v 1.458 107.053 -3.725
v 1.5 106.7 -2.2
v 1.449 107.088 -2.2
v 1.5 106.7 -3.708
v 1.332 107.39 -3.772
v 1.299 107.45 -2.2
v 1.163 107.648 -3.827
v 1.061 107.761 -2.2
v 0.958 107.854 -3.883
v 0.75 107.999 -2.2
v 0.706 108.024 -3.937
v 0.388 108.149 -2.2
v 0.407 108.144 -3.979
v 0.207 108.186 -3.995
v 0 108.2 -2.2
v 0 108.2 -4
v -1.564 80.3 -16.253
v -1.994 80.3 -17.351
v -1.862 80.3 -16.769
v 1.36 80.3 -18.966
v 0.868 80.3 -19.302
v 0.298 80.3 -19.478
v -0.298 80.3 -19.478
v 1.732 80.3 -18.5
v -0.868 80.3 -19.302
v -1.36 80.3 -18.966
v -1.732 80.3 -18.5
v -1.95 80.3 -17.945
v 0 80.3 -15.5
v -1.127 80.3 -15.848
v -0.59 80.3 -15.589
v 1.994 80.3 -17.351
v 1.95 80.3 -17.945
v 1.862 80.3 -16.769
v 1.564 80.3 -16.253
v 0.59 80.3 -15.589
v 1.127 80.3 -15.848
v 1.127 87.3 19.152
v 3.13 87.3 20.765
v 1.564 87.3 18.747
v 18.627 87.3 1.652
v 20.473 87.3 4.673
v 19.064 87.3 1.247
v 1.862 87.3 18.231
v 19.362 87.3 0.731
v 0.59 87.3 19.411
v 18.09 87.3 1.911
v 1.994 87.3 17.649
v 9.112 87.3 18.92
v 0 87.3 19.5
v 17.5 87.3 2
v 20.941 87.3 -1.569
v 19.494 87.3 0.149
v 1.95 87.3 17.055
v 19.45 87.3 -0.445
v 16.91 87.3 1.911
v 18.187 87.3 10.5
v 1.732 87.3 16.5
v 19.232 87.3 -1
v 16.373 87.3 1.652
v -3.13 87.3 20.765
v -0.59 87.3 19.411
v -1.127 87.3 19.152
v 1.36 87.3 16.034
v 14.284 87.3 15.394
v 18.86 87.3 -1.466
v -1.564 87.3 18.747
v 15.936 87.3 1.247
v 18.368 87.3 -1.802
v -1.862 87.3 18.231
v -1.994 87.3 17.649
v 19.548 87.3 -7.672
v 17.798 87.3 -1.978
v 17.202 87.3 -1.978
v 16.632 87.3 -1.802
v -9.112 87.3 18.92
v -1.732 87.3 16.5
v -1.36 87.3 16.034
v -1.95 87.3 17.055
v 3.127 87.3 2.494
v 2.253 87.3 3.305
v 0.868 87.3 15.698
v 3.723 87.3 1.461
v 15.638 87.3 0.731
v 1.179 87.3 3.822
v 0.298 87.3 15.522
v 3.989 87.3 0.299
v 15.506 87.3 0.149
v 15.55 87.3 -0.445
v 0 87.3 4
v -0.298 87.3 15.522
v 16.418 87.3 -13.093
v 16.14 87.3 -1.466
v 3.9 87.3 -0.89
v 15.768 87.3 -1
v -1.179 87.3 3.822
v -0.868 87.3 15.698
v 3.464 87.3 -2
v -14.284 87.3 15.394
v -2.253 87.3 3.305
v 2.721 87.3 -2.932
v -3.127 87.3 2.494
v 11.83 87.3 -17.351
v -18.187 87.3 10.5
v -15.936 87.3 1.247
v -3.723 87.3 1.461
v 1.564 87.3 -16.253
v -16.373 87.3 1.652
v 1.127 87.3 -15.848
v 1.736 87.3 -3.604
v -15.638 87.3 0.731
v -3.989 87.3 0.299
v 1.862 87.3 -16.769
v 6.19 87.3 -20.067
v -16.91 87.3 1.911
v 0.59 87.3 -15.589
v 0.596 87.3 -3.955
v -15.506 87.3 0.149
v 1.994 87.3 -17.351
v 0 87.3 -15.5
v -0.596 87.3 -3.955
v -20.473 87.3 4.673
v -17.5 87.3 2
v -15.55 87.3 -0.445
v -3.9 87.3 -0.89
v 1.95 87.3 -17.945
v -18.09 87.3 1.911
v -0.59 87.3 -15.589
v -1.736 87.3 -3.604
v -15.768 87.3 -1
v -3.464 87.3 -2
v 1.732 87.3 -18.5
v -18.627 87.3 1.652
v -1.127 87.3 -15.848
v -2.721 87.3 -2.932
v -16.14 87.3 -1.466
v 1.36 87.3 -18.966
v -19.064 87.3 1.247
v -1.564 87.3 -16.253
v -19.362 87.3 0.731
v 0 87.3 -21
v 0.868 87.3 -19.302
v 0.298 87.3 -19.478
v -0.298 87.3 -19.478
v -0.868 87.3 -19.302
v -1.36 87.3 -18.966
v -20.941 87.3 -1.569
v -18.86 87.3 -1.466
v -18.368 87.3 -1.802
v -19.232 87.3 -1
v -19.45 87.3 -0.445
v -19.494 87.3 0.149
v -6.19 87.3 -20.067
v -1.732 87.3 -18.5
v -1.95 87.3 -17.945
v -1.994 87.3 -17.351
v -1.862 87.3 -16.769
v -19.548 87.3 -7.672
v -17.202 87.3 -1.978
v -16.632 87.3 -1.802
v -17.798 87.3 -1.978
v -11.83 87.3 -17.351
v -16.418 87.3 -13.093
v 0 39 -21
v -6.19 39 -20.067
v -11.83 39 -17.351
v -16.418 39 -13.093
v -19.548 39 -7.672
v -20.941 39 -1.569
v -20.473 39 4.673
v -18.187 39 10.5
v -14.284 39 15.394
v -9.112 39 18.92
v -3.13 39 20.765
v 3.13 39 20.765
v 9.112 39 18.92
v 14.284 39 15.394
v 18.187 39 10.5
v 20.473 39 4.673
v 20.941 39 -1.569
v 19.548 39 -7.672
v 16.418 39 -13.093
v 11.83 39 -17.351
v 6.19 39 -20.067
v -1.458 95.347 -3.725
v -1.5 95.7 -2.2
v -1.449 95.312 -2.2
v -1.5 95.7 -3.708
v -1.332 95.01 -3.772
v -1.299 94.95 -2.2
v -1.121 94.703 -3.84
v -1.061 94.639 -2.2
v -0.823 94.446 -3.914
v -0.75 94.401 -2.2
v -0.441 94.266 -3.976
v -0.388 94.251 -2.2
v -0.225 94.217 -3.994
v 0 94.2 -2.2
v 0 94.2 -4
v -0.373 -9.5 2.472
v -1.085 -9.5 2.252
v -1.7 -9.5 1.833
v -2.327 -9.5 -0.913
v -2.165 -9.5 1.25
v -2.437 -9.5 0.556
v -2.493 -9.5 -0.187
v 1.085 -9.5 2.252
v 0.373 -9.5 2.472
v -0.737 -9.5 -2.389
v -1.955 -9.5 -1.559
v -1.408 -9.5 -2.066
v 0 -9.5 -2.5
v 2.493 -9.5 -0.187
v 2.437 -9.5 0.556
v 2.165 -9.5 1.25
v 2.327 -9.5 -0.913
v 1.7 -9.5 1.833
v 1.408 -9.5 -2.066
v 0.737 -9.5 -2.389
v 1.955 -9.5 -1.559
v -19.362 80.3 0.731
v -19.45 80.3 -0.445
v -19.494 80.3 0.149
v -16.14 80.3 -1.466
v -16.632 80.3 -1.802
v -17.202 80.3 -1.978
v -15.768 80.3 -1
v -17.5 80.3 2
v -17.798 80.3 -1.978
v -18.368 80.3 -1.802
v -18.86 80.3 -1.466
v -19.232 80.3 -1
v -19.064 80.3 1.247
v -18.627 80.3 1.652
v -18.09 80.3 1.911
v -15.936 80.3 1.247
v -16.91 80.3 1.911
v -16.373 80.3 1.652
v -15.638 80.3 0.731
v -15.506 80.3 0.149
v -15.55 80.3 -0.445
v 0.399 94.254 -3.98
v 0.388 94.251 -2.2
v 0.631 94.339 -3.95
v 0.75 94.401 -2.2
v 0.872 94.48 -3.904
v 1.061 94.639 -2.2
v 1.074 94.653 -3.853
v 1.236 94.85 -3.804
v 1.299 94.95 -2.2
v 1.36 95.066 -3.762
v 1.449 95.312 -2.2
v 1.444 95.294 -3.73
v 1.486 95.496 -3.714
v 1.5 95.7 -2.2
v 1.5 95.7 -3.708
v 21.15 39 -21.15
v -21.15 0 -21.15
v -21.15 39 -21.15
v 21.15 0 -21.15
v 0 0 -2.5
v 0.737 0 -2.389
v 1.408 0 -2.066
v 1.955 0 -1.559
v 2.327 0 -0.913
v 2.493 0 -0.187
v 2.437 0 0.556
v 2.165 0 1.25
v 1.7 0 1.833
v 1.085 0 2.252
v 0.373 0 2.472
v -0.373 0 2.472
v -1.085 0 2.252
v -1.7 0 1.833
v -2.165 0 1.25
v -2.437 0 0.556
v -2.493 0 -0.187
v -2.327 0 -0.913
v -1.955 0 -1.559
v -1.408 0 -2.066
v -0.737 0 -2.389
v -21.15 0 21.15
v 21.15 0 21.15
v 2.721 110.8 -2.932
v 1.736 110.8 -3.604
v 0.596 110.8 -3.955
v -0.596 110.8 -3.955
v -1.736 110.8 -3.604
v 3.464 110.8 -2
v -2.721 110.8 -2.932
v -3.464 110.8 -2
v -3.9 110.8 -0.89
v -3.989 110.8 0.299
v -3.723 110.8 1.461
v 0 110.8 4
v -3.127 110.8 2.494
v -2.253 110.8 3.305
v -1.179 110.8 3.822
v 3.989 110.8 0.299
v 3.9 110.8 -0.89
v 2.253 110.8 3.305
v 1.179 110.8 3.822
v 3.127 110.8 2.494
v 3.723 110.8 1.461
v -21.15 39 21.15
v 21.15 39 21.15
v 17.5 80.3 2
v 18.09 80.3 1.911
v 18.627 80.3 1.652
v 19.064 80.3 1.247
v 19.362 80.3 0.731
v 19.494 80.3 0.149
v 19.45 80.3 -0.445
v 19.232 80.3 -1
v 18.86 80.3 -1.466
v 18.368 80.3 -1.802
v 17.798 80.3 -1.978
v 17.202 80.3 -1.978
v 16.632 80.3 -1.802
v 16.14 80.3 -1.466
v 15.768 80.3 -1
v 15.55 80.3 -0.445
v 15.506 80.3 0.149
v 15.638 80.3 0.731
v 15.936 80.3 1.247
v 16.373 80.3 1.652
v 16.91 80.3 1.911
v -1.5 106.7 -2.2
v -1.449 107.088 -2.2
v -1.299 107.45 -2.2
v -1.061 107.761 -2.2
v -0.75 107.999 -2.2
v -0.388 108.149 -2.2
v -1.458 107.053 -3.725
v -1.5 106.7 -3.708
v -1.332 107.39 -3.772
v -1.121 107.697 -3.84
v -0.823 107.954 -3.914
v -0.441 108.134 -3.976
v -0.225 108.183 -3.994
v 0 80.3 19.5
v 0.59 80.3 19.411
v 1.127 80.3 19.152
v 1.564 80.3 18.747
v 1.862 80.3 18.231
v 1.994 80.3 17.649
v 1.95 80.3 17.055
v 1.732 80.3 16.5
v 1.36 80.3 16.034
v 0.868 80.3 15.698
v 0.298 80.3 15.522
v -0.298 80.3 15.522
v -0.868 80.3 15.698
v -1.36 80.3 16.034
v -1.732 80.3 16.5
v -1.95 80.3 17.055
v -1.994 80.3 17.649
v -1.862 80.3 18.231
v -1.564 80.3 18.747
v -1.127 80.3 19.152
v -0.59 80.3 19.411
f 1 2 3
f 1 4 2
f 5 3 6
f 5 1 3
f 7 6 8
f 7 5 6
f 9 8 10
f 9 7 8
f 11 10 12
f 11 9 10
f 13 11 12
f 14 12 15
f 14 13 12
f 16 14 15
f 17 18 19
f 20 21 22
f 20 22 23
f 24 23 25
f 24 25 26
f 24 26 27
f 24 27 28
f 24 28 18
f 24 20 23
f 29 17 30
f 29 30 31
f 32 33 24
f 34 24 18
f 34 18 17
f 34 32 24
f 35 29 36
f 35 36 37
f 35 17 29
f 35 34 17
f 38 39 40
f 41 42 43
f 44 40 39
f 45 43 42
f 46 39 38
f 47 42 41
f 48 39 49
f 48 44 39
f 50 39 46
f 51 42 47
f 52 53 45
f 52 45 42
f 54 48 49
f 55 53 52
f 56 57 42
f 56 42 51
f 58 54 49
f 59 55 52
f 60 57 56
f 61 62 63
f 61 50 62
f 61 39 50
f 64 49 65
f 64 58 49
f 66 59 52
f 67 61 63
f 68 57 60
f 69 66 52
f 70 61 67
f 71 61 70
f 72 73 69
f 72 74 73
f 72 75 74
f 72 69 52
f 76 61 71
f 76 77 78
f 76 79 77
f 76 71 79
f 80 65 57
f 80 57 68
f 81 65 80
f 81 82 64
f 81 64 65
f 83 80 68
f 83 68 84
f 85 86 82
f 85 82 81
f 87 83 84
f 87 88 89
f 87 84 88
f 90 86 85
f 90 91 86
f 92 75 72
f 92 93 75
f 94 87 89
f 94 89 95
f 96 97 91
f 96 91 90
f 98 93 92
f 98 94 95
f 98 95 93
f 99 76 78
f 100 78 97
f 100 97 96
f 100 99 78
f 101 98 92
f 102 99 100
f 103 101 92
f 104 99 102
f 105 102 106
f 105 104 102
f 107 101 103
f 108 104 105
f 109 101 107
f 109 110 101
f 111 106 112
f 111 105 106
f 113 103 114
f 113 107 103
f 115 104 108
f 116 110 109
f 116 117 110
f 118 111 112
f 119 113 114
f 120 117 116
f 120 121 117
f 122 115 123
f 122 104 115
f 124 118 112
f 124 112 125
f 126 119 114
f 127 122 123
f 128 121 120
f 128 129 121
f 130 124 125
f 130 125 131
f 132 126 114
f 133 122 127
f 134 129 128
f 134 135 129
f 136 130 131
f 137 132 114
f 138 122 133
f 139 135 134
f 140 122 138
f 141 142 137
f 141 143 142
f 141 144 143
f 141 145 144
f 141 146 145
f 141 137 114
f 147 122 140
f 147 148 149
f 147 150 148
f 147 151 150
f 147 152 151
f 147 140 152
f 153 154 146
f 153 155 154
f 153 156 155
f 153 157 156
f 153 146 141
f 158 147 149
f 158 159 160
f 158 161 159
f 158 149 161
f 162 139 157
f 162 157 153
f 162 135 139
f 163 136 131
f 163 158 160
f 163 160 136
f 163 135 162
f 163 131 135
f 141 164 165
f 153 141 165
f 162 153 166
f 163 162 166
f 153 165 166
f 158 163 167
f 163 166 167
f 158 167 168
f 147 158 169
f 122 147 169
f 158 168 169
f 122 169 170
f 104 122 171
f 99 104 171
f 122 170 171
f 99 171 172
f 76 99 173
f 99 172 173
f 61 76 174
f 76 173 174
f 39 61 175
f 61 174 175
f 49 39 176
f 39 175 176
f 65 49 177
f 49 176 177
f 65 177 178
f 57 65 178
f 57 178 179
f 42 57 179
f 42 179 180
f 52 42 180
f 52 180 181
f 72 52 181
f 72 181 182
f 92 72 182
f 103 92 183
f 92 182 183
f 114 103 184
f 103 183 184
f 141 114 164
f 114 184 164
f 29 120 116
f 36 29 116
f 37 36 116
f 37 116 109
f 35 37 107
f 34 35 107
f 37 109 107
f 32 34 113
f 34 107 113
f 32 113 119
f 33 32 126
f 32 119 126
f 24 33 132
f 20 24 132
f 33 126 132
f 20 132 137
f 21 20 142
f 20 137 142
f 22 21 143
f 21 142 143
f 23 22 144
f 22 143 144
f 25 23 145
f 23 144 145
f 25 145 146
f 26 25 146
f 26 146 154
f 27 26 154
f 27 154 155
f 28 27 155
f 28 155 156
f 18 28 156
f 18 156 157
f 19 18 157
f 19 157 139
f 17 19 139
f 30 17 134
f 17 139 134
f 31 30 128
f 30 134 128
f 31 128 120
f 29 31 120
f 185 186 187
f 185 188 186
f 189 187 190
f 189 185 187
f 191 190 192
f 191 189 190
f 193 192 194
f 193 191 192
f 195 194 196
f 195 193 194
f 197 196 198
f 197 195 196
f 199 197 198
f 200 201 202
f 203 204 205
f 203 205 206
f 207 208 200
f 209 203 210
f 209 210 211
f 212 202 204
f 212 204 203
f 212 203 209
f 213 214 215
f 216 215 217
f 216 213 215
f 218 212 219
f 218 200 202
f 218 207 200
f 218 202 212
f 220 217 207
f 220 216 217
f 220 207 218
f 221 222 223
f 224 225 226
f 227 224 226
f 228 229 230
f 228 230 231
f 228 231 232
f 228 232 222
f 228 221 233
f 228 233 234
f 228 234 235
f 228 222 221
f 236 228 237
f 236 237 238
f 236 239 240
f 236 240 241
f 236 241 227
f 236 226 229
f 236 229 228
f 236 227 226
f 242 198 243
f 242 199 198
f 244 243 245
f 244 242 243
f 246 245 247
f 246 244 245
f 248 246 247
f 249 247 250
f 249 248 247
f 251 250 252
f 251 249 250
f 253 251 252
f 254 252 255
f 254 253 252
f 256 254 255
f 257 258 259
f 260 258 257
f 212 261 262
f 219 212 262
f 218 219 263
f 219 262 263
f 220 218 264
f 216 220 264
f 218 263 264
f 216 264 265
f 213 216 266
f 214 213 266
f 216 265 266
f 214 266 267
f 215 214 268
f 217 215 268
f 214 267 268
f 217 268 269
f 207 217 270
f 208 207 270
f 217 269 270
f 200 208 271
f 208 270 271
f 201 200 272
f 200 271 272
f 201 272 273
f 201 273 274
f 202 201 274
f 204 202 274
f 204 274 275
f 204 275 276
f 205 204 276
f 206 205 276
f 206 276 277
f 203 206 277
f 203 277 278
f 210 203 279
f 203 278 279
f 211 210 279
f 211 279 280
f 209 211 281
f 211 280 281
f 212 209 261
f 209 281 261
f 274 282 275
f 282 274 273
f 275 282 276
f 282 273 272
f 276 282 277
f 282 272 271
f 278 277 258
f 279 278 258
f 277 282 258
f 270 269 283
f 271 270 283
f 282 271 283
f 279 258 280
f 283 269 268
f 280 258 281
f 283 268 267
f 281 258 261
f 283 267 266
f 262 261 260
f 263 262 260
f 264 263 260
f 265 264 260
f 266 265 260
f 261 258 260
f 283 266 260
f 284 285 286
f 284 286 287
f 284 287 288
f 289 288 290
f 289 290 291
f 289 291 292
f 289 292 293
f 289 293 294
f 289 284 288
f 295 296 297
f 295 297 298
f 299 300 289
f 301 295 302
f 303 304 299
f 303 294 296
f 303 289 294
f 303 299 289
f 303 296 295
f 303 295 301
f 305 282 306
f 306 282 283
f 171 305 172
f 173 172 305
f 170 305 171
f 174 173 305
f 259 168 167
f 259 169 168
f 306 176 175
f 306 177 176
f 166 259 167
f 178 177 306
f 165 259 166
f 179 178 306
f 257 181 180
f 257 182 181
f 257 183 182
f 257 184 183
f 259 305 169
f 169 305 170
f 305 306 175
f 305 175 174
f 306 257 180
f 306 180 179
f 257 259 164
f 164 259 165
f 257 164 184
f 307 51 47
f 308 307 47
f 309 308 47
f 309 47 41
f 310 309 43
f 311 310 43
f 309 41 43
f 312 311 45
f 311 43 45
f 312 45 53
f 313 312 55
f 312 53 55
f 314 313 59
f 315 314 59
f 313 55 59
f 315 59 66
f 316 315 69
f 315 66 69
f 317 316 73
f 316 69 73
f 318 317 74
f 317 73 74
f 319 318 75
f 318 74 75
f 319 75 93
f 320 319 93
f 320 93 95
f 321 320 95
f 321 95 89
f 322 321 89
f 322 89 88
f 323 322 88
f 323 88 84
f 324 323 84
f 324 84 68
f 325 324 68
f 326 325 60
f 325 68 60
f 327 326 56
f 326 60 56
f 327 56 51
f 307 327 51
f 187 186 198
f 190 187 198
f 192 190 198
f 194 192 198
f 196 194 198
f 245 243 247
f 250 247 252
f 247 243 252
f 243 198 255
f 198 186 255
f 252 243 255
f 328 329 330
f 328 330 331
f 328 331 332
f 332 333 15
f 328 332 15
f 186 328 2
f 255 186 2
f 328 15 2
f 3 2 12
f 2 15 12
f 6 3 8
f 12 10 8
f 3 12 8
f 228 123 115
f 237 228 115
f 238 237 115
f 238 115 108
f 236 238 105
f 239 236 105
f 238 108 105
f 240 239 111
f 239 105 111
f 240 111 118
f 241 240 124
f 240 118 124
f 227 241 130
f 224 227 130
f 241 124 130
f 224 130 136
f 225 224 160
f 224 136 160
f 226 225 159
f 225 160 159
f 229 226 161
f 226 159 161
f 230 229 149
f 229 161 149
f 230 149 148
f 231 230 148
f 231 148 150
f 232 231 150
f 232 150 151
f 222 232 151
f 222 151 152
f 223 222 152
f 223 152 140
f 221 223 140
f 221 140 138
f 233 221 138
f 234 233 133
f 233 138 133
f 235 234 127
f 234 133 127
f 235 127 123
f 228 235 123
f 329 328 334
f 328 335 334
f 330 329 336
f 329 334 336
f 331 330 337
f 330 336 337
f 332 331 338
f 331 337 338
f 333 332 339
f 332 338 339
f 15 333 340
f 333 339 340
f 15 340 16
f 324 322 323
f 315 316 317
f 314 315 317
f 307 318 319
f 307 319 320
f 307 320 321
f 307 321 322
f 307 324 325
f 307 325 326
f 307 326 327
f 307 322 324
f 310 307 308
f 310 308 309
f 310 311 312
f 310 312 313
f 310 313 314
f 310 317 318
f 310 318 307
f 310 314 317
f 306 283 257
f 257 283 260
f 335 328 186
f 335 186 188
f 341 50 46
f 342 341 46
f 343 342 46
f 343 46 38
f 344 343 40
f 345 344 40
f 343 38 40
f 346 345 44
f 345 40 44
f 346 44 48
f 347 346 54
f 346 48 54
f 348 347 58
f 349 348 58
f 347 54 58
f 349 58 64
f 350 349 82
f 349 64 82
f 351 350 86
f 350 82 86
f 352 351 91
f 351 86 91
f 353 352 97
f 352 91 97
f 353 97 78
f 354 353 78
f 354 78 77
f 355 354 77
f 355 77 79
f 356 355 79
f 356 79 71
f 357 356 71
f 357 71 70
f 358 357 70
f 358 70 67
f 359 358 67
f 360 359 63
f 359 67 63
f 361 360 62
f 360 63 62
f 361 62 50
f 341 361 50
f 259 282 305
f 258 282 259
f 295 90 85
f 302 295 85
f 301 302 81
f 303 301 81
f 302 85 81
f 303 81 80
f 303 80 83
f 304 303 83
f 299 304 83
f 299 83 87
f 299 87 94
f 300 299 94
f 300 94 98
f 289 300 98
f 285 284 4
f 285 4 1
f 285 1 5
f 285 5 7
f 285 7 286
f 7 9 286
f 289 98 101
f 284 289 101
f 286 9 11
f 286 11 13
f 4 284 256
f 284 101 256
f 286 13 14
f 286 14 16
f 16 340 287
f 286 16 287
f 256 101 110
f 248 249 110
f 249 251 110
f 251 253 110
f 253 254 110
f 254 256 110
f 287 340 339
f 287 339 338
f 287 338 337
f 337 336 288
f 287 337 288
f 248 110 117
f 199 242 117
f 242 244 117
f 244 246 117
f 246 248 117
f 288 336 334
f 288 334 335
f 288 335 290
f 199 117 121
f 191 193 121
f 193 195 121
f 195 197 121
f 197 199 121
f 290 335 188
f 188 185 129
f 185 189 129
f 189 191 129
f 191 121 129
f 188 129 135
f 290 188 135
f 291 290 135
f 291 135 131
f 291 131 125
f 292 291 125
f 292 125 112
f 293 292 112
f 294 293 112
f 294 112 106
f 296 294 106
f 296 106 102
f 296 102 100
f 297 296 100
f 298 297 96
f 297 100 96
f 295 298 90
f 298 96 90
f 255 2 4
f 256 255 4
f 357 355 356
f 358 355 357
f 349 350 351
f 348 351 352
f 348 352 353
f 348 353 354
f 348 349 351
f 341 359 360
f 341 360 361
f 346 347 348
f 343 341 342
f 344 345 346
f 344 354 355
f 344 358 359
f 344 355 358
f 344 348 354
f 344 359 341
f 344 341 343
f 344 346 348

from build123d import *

# Parameters (mm, degrees)
SKETCH2_W           = 42.3
SKETCH2_H           = 42.3
BOSS_EXTRUDE1_DEPTH = 39
SKETCH3_R           = 21
BOSS_EXTRUDE2_DEPTH = 48.3
SKETCH4_R           = 4
BOSS_EXTRUDE3_DEPTH = 23.5
SKETCH5_R           = 2.5
BOSS_EXTRUDE4_DEPTH = 9.5
CUT_EXTRUDE1_START  = -2.6
SKETCH6_W           = 3
SKETCH6_H           = 3
CUT_EXTRUDE1_DEPTH  = 14
FILLET1_R           = 1.5
SKETCH7_R           = 2
CUT_EXTRUDE2_DEPTH  = 7


with BuildPart() as part:
    # Sketch2 → Boss-Extrude1 (new body)
    with BuildSketch(Plane(origin=(0, 0, 0), x_dir=(1, 0, 0), z_dir=(0, 1, 0))):
        Rectangle(SKETCH2_W, SKETCH2_H)
    extrude(amount=BOSS_EXTRUDE1_DEPTH)

    # Sketch3 → Boss-Extrude2 (add)
    with BuildSketch(Plane(origin=(0, 39, 0), x_dir=(1, 0, 0), z_dir=(0, 1, 0))):
        with Locations(Location((0, 0, 0), (0, 0, 90))):
            Circle(SKETCH3_R)
    extrude(amount=BOSS_EXTRUDE2_DEPTH)

    # Sketch4 → Boss-Extrude3 (add)
    with BuildSketch(Plane(origin=(0, 87.3, 0), x_dir=(1, 0, 0), z_dir=(0, 1, 0))):
        with Locations(Location((0, 0, 0), (0, 0, 270))):
            Circle(SKETCH4_R)
    extrude(amount=BOSS_EXTRUDE3_DEPTH)

    # Sketch5 → Boss-Extrude4 (add)
    with BuildSketch(Plane.XZ):
        with Locations(Location((0, 0, 0), (0, 0, 270))):
            Circle(SKETCH5_R)
    extrude(amount=BOSS_EXTRUDE4_DEPTH)

    # Sketch6 → Cut-Extrude1 (cut)
    with BuildSketch(Plane(origin=(0, 110.8, 0), x_dir=(1, 0, 0), z_dir=(0, 1, 0)).offset(CUT_EXTRUDE1_START)):
        with Locations((0, 3.7)):
            Rectangle(SKETCH6_W, SKETCH6_H)
    extrude(amount=-CUT_EXTRUDE1_DEPTH, mode=Mode.SUBTRACT)

    # Fillet1
    fillet1_edges = [part.edges().sort_by_distance(p)[0] for p in [
        (1.5, 94.2, -2.954049622),
        (-1.5, 94.2, -2.954049622),
        (1.5, 108.2, -2.954049622),
        (-1.5, 108.2, -2.954049622),
    ]]
    fillet(fillet1_edges, radius=FILLET1_R - 0.0001)  # a hair under: the kernel refuses the full size

    # Sketch7 → Cut-Extrude2 (cut)
    with BuildSketch(Plane(origin=(0, 87.3, 0), x_dir=(1, 0, 0), z_dir=(0, 1, 0))):
        with Locations(Location((0, 17.5, 0), (0, 0, 270))):
            Circle(SKETCH7_R)
        with Locations(Location((17.5, 0, 0), (0, 0, 270))):
            Circle(SKETCH7_R)
        with Locations(Location((0, -17.5, 0), (0, 0, 270))):
            Circle(SKETCH7_R)
        with Locations(Location((-17.5, 0, 0), (0, 0, 270))):
            Circle(SKETCH7_R)
    extrude(amount=-CUT_EXTRUDE2_DEPTH, mode=Mode.SUBTRACT)


solid = part.part
